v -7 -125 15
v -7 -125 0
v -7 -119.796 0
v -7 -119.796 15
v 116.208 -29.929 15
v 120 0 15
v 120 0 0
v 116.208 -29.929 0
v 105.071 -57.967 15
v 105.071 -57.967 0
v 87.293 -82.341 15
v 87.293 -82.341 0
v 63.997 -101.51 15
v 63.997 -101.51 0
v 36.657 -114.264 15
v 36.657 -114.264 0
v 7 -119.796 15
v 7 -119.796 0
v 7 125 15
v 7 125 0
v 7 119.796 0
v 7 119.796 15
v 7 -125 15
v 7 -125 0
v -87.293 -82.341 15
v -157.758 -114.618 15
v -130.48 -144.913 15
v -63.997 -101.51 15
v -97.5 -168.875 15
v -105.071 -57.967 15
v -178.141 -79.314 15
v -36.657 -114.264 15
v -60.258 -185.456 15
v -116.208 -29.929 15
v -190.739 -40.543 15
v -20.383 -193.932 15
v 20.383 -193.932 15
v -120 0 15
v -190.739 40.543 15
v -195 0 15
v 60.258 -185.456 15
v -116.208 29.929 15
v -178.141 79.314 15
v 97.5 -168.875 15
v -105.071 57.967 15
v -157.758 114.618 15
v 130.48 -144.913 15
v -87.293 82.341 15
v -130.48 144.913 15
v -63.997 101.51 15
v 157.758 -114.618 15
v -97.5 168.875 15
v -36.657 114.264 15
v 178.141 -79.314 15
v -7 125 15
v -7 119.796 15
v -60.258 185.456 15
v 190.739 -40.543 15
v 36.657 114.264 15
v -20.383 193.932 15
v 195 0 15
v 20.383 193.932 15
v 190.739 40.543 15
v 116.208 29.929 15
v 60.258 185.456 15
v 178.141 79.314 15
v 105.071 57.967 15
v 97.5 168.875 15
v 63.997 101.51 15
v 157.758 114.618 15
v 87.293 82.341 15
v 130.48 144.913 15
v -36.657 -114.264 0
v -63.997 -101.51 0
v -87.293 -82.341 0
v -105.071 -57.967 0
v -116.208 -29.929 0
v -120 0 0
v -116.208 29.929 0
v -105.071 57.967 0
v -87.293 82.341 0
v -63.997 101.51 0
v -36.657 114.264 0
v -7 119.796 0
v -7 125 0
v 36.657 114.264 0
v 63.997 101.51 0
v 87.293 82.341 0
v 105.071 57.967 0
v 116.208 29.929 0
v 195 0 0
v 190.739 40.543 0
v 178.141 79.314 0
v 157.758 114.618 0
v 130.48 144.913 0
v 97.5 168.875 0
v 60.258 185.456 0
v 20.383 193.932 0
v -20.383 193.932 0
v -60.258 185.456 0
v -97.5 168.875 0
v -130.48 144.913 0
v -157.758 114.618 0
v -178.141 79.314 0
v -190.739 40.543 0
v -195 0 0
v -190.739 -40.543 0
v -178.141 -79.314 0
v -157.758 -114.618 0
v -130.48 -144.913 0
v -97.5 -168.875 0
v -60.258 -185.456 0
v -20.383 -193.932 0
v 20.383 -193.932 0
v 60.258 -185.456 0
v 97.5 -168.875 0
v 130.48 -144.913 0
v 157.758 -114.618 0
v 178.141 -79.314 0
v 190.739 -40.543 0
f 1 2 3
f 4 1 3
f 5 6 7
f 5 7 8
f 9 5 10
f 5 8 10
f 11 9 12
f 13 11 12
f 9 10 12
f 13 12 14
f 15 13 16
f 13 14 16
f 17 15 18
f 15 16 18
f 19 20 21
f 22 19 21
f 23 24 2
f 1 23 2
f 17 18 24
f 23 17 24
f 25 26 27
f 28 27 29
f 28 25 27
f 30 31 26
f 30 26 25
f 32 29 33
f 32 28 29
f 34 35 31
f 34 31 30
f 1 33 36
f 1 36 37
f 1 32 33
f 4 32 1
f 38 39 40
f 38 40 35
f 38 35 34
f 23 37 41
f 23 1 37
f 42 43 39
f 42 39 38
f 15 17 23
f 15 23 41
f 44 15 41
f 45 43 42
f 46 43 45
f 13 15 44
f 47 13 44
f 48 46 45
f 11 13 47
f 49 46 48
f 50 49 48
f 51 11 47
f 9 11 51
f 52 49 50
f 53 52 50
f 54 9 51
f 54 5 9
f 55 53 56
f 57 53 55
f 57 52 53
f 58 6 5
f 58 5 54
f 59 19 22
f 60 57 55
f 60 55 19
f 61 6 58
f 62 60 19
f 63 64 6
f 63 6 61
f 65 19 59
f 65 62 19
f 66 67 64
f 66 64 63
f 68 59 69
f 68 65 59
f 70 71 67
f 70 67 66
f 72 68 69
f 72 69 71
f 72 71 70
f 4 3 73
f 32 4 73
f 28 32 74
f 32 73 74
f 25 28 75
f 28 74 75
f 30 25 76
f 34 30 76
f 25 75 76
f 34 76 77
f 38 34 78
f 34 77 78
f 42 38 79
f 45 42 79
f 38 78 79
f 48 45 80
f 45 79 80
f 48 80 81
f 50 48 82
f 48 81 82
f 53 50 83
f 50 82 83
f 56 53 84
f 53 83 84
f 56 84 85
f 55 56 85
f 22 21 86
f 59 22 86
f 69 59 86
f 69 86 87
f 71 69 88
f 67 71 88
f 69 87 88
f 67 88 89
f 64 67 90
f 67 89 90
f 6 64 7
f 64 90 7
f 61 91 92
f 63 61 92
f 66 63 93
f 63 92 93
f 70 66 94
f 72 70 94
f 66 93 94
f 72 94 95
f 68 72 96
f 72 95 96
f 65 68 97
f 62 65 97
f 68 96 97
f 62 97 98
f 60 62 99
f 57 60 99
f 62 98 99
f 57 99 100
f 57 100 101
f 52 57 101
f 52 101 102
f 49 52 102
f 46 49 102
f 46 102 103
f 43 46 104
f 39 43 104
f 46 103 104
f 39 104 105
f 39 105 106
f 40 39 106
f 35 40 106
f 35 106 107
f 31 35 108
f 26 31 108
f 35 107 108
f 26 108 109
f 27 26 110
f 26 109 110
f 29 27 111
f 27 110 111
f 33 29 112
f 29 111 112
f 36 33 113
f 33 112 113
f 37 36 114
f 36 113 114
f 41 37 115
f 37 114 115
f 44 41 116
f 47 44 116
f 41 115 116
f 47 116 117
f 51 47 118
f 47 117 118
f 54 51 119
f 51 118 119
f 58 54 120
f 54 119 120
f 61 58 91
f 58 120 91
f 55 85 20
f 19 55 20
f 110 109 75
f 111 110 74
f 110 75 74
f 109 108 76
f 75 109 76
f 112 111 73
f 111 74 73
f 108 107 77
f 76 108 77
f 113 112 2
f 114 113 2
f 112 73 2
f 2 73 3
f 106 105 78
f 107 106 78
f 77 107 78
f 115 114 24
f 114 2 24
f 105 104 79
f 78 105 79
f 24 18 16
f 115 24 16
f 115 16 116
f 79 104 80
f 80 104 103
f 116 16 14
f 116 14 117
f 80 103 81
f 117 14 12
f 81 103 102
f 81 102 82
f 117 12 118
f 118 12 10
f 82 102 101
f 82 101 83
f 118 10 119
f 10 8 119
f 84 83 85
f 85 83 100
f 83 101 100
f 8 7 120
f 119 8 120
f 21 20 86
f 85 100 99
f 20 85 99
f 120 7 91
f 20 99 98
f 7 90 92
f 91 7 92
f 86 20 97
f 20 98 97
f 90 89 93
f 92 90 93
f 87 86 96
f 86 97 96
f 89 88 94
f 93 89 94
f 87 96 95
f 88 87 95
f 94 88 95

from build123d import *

# Parameters (mm, degrees)
F0_R     = 195
F1_DEPTH = 15


with BuildPart() as f1:
    # F0 (on Top) → F1 (new body)
    with BuildSketch(Plane.XY):
        Circle(F0_R)
        with BuildLine():
            ThreePointArc((7, 119.795659), (87.292611, 82.340755), (120, 0))
            ThreePointArc((120, 0), (87.292611, -82.340755), (7, -119.795659))
            Line((7, -119.795659), (7, -125))
            Line((7, -125), (-7, -125))
            Line((-7, -125), (-7, -119.795659))
            ThreePointArc((-7, -119.795659), (-120, 0), (-7, 119.795659))
            Line((-7, 119.795659), (-7, 125))
            Line((-7, 125), (7, 125))
            Line((7, 125), (7, 119.795659))
        make_face(mode=Mode.SUBTRACT)
    extrude(amount=F1_DEPTH)


solid = f1.part
